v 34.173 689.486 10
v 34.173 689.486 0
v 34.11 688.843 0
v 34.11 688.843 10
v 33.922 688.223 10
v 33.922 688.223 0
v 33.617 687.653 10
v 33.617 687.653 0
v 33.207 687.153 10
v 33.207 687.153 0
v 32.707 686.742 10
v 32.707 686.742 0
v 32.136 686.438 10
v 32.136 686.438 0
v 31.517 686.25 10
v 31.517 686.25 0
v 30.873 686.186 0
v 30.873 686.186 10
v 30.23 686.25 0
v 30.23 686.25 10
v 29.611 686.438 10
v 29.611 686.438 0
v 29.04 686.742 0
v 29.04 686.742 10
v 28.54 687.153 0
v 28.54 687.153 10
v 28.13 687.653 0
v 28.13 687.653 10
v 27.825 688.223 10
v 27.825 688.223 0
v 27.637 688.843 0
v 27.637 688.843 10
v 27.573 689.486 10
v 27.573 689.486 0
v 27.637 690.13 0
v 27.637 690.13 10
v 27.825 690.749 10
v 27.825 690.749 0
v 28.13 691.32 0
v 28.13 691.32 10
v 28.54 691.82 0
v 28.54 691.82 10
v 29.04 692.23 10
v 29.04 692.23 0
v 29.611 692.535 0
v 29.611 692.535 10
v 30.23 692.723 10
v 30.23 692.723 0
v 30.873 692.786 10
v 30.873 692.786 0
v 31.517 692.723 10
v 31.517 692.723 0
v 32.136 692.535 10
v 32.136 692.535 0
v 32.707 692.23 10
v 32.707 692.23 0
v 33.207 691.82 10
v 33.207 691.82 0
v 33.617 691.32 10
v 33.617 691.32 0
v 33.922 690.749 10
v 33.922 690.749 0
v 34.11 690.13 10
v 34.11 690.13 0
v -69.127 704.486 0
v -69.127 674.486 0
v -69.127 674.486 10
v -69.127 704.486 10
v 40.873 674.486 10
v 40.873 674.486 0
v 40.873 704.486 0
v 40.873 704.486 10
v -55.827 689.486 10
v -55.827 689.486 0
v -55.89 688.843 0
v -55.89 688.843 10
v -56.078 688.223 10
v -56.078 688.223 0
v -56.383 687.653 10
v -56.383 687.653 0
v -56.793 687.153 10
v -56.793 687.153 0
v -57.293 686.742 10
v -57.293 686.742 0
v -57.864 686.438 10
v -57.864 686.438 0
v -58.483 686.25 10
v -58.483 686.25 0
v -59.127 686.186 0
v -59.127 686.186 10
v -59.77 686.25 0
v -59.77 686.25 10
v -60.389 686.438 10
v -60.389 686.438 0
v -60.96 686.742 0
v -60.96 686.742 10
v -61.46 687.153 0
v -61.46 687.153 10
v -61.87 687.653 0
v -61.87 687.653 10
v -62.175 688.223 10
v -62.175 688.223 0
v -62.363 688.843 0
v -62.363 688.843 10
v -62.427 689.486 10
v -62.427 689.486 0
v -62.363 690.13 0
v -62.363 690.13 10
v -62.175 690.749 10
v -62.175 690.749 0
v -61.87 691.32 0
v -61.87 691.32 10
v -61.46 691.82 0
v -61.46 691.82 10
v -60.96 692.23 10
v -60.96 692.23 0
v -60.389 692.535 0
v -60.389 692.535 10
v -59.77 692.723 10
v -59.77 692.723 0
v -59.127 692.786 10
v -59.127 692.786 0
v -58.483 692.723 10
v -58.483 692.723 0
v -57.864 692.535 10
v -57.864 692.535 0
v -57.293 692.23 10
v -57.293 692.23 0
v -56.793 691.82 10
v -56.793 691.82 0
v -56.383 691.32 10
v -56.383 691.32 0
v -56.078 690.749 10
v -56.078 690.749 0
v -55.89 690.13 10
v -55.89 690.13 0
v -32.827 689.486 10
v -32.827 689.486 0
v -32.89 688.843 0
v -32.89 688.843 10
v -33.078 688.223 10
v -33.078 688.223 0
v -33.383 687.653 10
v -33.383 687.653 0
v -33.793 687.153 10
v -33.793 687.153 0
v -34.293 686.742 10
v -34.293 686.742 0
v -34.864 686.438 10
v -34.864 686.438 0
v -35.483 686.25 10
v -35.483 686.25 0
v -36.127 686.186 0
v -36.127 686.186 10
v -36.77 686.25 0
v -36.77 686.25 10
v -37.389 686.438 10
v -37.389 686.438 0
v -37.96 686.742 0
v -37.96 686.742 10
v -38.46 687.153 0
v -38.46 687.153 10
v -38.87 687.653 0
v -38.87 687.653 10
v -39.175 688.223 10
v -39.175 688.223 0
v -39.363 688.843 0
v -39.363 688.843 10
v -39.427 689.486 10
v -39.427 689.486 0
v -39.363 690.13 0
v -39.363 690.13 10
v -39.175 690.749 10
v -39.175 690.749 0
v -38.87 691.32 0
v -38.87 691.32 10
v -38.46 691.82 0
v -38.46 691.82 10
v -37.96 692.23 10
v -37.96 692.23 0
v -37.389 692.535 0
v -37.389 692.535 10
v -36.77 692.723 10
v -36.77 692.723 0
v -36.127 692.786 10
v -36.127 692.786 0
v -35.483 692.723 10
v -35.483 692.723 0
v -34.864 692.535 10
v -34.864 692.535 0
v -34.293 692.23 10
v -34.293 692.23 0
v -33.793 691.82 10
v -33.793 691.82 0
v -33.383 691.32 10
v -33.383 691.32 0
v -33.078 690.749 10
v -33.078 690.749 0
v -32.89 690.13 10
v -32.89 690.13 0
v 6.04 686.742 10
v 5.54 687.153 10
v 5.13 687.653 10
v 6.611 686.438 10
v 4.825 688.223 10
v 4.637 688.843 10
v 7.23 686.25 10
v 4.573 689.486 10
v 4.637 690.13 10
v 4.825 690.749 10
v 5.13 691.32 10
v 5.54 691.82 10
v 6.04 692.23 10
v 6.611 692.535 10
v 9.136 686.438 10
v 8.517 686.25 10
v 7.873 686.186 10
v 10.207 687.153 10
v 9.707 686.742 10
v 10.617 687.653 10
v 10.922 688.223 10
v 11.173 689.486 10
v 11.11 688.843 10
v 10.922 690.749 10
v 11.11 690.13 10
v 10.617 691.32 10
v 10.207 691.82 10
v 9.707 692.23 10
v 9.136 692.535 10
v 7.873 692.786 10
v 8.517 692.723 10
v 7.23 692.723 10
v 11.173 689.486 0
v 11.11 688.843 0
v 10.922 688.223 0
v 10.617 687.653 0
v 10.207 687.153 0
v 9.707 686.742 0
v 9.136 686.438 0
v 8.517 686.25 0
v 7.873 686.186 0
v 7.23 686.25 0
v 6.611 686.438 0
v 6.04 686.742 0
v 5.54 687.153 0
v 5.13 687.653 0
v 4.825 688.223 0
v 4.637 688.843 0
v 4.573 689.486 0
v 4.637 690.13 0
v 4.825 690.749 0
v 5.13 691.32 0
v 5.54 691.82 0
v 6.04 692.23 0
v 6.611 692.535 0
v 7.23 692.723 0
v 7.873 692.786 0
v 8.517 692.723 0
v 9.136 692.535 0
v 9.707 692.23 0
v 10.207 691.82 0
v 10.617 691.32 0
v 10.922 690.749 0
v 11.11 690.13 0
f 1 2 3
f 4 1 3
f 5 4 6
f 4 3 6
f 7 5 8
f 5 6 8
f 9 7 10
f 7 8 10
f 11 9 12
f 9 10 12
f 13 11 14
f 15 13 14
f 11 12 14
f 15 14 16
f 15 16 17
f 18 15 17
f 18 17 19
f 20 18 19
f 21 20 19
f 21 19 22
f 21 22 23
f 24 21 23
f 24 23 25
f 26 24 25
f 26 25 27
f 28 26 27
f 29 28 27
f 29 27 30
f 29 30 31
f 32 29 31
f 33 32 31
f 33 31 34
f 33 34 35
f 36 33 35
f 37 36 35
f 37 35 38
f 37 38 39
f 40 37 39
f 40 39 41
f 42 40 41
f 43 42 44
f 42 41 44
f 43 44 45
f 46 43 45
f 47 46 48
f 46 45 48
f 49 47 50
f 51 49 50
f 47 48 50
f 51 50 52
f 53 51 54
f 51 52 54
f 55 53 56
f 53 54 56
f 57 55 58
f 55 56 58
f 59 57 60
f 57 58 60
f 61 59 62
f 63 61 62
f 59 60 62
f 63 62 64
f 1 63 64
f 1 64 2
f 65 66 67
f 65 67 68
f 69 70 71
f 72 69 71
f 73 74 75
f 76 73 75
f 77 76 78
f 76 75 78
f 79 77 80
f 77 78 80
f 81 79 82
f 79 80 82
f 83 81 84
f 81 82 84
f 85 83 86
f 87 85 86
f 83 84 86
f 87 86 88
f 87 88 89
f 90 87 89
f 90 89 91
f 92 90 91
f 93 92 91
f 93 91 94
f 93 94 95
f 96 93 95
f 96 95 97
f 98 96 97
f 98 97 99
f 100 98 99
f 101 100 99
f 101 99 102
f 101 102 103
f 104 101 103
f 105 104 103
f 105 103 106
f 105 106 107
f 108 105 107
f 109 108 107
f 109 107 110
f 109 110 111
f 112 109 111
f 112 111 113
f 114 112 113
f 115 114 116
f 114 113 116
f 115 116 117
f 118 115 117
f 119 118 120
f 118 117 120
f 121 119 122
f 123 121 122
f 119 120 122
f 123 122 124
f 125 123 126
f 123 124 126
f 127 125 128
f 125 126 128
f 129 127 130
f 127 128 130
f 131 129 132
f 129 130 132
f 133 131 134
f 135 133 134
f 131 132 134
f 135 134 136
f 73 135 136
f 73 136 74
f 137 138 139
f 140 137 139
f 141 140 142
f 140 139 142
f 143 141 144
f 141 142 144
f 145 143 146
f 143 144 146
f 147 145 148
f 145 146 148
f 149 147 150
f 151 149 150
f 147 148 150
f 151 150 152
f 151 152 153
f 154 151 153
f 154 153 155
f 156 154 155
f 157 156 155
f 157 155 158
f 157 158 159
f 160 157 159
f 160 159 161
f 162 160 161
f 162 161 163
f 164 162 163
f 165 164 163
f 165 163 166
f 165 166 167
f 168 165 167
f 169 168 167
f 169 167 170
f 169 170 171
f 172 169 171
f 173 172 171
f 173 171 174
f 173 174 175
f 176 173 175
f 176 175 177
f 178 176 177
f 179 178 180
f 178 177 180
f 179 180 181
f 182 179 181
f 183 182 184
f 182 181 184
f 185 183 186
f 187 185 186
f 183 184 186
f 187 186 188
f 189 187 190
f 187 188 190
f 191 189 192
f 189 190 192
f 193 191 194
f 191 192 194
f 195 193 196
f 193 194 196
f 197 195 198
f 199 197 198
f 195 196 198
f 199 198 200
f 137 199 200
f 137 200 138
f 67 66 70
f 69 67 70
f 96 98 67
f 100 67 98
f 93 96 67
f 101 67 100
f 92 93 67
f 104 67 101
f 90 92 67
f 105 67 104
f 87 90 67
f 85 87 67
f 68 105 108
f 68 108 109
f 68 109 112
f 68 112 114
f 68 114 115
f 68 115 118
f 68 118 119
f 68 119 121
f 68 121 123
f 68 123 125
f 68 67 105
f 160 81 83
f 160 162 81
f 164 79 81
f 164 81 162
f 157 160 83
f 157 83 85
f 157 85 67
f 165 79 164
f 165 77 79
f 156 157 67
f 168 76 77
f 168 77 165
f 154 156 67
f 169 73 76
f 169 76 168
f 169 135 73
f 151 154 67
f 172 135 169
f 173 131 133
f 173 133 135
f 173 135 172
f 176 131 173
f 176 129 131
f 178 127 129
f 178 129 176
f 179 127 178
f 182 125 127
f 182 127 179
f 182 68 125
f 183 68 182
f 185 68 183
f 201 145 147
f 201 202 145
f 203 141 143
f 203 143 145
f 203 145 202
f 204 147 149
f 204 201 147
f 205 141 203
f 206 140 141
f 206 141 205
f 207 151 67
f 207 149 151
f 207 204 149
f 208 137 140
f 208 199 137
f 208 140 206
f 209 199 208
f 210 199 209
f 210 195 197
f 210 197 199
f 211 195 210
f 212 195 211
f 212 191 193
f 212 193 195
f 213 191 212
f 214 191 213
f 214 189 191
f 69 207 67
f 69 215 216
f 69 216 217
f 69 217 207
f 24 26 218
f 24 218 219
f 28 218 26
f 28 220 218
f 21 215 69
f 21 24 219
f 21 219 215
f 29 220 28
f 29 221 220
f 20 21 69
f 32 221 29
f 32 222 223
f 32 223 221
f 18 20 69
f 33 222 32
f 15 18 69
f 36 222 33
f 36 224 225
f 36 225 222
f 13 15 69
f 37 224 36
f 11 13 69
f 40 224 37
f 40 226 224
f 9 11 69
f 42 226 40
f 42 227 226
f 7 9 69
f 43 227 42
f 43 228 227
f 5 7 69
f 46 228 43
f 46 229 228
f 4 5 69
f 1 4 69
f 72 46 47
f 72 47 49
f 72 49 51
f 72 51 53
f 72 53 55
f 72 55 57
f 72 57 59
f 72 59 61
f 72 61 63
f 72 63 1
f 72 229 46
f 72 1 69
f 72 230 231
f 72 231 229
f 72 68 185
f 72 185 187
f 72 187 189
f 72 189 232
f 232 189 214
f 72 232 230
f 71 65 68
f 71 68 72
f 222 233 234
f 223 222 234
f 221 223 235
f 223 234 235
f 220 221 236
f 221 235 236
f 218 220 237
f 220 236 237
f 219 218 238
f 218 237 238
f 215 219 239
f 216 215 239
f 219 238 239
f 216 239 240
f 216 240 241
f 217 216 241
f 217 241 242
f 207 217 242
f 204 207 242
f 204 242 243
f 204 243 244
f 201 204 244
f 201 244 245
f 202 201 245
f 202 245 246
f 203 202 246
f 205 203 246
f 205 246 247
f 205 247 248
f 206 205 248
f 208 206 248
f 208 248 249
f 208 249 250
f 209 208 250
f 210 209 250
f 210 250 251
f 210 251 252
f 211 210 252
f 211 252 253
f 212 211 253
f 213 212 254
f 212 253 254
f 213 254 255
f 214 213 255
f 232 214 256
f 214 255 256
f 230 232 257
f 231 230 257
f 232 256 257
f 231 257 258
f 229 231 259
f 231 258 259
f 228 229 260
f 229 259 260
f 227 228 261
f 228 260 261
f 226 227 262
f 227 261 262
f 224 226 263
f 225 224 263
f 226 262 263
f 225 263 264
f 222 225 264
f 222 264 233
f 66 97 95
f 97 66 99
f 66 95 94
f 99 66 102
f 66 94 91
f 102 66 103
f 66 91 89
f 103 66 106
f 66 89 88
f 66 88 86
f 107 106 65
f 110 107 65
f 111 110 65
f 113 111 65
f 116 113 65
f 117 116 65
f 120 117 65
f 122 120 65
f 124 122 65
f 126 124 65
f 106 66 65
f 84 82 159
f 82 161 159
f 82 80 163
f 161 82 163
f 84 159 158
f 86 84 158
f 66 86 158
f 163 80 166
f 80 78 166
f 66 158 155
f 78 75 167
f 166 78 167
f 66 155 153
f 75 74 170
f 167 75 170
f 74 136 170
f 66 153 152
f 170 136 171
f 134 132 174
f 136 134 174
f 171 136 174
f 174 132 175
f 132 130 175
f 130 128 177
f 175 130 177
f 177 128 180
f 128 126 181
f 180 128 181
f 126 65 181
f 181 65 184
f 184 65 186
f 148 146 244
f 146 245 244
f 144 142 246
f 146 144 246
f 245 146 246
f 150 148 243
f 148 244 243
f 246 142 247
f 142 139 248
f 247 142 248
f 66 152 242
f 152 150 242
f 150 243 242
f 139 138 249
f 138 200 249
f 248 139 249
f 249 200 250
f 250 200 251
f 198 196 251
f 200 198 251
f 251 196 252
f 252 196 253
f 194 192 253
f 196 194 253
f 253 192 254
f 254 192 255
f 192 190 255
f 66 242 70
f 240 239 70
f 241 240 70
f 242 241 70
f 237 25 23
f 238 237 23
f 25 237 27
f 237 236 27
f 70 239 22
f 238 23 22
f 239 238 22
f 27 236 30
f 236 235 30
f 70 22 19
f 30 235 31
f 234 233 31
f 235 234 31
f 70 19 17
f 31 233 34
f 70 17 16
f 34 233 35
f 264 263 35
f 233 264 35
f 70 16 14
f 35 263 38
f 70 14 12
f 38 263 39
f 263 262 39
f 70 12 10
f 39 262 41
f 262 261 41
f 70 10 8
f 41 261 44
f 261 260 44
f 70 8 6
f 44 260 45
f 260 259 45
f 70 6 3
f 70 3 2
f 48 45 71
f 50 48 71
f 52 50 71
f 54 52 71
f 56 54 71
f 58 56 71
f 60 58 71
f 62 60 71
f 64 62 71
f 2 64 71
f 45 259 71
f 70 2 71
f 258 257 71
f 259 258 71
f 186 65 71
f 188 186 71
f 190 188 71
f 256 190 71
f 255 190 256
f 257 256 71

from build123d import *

# Parameters (mm, degrees)
SKETCH1_W           = 110
SKETCH1_H           = 30
BOSS_EXTRUDE1_DEPTH = 10
M6_CLEARANCE_HOLE_D = 6.6


with BuildPart() as part:
    # Sketch1 → Boss-Extrude1 (new body)
    with BuildSketch(Plane.XY):
        with Locations((-14.126560257, 689.486311854)):
            Rectangle(SKETCH1_W, SKETCH1_H)
    extrude(amount=BOSS_EXTRUDE1_DEPTH)

    # M6 Clearance Hole (through all)
    with Locations(Plane(origin=(545.719230148, 1586.957920749, 10), x_dir=(-1, 0, 0), z_dir=(0, 0, 1))):
        with Locations((514.845790405, 1450.886073068), (514.845790405, 1412.886073068), (537.845790405, 1453.886073068), (537.845790405, 1409.886073068), (581.845790405, 1453.886073068), (581.845790405, 1409.886073068), (604.845790405, 1450.886073068), (604.845790405, 1412.886073068), (514.845790405, 897.471608895), (537.845790405, 897.471608895), (581.845790405, 897.471608895), (604.845790405, 897.471608895), (394.752371414, 1482.156083565), (514.845790405, 1431.886073068), (537.845790405, 1431.886073068), (581.845790405, 1431.886073068), (604.845790405, 1431.886073068)):
            Hole(M6_CLEARANCE_HOLE_D / 2)


solid = part.part
